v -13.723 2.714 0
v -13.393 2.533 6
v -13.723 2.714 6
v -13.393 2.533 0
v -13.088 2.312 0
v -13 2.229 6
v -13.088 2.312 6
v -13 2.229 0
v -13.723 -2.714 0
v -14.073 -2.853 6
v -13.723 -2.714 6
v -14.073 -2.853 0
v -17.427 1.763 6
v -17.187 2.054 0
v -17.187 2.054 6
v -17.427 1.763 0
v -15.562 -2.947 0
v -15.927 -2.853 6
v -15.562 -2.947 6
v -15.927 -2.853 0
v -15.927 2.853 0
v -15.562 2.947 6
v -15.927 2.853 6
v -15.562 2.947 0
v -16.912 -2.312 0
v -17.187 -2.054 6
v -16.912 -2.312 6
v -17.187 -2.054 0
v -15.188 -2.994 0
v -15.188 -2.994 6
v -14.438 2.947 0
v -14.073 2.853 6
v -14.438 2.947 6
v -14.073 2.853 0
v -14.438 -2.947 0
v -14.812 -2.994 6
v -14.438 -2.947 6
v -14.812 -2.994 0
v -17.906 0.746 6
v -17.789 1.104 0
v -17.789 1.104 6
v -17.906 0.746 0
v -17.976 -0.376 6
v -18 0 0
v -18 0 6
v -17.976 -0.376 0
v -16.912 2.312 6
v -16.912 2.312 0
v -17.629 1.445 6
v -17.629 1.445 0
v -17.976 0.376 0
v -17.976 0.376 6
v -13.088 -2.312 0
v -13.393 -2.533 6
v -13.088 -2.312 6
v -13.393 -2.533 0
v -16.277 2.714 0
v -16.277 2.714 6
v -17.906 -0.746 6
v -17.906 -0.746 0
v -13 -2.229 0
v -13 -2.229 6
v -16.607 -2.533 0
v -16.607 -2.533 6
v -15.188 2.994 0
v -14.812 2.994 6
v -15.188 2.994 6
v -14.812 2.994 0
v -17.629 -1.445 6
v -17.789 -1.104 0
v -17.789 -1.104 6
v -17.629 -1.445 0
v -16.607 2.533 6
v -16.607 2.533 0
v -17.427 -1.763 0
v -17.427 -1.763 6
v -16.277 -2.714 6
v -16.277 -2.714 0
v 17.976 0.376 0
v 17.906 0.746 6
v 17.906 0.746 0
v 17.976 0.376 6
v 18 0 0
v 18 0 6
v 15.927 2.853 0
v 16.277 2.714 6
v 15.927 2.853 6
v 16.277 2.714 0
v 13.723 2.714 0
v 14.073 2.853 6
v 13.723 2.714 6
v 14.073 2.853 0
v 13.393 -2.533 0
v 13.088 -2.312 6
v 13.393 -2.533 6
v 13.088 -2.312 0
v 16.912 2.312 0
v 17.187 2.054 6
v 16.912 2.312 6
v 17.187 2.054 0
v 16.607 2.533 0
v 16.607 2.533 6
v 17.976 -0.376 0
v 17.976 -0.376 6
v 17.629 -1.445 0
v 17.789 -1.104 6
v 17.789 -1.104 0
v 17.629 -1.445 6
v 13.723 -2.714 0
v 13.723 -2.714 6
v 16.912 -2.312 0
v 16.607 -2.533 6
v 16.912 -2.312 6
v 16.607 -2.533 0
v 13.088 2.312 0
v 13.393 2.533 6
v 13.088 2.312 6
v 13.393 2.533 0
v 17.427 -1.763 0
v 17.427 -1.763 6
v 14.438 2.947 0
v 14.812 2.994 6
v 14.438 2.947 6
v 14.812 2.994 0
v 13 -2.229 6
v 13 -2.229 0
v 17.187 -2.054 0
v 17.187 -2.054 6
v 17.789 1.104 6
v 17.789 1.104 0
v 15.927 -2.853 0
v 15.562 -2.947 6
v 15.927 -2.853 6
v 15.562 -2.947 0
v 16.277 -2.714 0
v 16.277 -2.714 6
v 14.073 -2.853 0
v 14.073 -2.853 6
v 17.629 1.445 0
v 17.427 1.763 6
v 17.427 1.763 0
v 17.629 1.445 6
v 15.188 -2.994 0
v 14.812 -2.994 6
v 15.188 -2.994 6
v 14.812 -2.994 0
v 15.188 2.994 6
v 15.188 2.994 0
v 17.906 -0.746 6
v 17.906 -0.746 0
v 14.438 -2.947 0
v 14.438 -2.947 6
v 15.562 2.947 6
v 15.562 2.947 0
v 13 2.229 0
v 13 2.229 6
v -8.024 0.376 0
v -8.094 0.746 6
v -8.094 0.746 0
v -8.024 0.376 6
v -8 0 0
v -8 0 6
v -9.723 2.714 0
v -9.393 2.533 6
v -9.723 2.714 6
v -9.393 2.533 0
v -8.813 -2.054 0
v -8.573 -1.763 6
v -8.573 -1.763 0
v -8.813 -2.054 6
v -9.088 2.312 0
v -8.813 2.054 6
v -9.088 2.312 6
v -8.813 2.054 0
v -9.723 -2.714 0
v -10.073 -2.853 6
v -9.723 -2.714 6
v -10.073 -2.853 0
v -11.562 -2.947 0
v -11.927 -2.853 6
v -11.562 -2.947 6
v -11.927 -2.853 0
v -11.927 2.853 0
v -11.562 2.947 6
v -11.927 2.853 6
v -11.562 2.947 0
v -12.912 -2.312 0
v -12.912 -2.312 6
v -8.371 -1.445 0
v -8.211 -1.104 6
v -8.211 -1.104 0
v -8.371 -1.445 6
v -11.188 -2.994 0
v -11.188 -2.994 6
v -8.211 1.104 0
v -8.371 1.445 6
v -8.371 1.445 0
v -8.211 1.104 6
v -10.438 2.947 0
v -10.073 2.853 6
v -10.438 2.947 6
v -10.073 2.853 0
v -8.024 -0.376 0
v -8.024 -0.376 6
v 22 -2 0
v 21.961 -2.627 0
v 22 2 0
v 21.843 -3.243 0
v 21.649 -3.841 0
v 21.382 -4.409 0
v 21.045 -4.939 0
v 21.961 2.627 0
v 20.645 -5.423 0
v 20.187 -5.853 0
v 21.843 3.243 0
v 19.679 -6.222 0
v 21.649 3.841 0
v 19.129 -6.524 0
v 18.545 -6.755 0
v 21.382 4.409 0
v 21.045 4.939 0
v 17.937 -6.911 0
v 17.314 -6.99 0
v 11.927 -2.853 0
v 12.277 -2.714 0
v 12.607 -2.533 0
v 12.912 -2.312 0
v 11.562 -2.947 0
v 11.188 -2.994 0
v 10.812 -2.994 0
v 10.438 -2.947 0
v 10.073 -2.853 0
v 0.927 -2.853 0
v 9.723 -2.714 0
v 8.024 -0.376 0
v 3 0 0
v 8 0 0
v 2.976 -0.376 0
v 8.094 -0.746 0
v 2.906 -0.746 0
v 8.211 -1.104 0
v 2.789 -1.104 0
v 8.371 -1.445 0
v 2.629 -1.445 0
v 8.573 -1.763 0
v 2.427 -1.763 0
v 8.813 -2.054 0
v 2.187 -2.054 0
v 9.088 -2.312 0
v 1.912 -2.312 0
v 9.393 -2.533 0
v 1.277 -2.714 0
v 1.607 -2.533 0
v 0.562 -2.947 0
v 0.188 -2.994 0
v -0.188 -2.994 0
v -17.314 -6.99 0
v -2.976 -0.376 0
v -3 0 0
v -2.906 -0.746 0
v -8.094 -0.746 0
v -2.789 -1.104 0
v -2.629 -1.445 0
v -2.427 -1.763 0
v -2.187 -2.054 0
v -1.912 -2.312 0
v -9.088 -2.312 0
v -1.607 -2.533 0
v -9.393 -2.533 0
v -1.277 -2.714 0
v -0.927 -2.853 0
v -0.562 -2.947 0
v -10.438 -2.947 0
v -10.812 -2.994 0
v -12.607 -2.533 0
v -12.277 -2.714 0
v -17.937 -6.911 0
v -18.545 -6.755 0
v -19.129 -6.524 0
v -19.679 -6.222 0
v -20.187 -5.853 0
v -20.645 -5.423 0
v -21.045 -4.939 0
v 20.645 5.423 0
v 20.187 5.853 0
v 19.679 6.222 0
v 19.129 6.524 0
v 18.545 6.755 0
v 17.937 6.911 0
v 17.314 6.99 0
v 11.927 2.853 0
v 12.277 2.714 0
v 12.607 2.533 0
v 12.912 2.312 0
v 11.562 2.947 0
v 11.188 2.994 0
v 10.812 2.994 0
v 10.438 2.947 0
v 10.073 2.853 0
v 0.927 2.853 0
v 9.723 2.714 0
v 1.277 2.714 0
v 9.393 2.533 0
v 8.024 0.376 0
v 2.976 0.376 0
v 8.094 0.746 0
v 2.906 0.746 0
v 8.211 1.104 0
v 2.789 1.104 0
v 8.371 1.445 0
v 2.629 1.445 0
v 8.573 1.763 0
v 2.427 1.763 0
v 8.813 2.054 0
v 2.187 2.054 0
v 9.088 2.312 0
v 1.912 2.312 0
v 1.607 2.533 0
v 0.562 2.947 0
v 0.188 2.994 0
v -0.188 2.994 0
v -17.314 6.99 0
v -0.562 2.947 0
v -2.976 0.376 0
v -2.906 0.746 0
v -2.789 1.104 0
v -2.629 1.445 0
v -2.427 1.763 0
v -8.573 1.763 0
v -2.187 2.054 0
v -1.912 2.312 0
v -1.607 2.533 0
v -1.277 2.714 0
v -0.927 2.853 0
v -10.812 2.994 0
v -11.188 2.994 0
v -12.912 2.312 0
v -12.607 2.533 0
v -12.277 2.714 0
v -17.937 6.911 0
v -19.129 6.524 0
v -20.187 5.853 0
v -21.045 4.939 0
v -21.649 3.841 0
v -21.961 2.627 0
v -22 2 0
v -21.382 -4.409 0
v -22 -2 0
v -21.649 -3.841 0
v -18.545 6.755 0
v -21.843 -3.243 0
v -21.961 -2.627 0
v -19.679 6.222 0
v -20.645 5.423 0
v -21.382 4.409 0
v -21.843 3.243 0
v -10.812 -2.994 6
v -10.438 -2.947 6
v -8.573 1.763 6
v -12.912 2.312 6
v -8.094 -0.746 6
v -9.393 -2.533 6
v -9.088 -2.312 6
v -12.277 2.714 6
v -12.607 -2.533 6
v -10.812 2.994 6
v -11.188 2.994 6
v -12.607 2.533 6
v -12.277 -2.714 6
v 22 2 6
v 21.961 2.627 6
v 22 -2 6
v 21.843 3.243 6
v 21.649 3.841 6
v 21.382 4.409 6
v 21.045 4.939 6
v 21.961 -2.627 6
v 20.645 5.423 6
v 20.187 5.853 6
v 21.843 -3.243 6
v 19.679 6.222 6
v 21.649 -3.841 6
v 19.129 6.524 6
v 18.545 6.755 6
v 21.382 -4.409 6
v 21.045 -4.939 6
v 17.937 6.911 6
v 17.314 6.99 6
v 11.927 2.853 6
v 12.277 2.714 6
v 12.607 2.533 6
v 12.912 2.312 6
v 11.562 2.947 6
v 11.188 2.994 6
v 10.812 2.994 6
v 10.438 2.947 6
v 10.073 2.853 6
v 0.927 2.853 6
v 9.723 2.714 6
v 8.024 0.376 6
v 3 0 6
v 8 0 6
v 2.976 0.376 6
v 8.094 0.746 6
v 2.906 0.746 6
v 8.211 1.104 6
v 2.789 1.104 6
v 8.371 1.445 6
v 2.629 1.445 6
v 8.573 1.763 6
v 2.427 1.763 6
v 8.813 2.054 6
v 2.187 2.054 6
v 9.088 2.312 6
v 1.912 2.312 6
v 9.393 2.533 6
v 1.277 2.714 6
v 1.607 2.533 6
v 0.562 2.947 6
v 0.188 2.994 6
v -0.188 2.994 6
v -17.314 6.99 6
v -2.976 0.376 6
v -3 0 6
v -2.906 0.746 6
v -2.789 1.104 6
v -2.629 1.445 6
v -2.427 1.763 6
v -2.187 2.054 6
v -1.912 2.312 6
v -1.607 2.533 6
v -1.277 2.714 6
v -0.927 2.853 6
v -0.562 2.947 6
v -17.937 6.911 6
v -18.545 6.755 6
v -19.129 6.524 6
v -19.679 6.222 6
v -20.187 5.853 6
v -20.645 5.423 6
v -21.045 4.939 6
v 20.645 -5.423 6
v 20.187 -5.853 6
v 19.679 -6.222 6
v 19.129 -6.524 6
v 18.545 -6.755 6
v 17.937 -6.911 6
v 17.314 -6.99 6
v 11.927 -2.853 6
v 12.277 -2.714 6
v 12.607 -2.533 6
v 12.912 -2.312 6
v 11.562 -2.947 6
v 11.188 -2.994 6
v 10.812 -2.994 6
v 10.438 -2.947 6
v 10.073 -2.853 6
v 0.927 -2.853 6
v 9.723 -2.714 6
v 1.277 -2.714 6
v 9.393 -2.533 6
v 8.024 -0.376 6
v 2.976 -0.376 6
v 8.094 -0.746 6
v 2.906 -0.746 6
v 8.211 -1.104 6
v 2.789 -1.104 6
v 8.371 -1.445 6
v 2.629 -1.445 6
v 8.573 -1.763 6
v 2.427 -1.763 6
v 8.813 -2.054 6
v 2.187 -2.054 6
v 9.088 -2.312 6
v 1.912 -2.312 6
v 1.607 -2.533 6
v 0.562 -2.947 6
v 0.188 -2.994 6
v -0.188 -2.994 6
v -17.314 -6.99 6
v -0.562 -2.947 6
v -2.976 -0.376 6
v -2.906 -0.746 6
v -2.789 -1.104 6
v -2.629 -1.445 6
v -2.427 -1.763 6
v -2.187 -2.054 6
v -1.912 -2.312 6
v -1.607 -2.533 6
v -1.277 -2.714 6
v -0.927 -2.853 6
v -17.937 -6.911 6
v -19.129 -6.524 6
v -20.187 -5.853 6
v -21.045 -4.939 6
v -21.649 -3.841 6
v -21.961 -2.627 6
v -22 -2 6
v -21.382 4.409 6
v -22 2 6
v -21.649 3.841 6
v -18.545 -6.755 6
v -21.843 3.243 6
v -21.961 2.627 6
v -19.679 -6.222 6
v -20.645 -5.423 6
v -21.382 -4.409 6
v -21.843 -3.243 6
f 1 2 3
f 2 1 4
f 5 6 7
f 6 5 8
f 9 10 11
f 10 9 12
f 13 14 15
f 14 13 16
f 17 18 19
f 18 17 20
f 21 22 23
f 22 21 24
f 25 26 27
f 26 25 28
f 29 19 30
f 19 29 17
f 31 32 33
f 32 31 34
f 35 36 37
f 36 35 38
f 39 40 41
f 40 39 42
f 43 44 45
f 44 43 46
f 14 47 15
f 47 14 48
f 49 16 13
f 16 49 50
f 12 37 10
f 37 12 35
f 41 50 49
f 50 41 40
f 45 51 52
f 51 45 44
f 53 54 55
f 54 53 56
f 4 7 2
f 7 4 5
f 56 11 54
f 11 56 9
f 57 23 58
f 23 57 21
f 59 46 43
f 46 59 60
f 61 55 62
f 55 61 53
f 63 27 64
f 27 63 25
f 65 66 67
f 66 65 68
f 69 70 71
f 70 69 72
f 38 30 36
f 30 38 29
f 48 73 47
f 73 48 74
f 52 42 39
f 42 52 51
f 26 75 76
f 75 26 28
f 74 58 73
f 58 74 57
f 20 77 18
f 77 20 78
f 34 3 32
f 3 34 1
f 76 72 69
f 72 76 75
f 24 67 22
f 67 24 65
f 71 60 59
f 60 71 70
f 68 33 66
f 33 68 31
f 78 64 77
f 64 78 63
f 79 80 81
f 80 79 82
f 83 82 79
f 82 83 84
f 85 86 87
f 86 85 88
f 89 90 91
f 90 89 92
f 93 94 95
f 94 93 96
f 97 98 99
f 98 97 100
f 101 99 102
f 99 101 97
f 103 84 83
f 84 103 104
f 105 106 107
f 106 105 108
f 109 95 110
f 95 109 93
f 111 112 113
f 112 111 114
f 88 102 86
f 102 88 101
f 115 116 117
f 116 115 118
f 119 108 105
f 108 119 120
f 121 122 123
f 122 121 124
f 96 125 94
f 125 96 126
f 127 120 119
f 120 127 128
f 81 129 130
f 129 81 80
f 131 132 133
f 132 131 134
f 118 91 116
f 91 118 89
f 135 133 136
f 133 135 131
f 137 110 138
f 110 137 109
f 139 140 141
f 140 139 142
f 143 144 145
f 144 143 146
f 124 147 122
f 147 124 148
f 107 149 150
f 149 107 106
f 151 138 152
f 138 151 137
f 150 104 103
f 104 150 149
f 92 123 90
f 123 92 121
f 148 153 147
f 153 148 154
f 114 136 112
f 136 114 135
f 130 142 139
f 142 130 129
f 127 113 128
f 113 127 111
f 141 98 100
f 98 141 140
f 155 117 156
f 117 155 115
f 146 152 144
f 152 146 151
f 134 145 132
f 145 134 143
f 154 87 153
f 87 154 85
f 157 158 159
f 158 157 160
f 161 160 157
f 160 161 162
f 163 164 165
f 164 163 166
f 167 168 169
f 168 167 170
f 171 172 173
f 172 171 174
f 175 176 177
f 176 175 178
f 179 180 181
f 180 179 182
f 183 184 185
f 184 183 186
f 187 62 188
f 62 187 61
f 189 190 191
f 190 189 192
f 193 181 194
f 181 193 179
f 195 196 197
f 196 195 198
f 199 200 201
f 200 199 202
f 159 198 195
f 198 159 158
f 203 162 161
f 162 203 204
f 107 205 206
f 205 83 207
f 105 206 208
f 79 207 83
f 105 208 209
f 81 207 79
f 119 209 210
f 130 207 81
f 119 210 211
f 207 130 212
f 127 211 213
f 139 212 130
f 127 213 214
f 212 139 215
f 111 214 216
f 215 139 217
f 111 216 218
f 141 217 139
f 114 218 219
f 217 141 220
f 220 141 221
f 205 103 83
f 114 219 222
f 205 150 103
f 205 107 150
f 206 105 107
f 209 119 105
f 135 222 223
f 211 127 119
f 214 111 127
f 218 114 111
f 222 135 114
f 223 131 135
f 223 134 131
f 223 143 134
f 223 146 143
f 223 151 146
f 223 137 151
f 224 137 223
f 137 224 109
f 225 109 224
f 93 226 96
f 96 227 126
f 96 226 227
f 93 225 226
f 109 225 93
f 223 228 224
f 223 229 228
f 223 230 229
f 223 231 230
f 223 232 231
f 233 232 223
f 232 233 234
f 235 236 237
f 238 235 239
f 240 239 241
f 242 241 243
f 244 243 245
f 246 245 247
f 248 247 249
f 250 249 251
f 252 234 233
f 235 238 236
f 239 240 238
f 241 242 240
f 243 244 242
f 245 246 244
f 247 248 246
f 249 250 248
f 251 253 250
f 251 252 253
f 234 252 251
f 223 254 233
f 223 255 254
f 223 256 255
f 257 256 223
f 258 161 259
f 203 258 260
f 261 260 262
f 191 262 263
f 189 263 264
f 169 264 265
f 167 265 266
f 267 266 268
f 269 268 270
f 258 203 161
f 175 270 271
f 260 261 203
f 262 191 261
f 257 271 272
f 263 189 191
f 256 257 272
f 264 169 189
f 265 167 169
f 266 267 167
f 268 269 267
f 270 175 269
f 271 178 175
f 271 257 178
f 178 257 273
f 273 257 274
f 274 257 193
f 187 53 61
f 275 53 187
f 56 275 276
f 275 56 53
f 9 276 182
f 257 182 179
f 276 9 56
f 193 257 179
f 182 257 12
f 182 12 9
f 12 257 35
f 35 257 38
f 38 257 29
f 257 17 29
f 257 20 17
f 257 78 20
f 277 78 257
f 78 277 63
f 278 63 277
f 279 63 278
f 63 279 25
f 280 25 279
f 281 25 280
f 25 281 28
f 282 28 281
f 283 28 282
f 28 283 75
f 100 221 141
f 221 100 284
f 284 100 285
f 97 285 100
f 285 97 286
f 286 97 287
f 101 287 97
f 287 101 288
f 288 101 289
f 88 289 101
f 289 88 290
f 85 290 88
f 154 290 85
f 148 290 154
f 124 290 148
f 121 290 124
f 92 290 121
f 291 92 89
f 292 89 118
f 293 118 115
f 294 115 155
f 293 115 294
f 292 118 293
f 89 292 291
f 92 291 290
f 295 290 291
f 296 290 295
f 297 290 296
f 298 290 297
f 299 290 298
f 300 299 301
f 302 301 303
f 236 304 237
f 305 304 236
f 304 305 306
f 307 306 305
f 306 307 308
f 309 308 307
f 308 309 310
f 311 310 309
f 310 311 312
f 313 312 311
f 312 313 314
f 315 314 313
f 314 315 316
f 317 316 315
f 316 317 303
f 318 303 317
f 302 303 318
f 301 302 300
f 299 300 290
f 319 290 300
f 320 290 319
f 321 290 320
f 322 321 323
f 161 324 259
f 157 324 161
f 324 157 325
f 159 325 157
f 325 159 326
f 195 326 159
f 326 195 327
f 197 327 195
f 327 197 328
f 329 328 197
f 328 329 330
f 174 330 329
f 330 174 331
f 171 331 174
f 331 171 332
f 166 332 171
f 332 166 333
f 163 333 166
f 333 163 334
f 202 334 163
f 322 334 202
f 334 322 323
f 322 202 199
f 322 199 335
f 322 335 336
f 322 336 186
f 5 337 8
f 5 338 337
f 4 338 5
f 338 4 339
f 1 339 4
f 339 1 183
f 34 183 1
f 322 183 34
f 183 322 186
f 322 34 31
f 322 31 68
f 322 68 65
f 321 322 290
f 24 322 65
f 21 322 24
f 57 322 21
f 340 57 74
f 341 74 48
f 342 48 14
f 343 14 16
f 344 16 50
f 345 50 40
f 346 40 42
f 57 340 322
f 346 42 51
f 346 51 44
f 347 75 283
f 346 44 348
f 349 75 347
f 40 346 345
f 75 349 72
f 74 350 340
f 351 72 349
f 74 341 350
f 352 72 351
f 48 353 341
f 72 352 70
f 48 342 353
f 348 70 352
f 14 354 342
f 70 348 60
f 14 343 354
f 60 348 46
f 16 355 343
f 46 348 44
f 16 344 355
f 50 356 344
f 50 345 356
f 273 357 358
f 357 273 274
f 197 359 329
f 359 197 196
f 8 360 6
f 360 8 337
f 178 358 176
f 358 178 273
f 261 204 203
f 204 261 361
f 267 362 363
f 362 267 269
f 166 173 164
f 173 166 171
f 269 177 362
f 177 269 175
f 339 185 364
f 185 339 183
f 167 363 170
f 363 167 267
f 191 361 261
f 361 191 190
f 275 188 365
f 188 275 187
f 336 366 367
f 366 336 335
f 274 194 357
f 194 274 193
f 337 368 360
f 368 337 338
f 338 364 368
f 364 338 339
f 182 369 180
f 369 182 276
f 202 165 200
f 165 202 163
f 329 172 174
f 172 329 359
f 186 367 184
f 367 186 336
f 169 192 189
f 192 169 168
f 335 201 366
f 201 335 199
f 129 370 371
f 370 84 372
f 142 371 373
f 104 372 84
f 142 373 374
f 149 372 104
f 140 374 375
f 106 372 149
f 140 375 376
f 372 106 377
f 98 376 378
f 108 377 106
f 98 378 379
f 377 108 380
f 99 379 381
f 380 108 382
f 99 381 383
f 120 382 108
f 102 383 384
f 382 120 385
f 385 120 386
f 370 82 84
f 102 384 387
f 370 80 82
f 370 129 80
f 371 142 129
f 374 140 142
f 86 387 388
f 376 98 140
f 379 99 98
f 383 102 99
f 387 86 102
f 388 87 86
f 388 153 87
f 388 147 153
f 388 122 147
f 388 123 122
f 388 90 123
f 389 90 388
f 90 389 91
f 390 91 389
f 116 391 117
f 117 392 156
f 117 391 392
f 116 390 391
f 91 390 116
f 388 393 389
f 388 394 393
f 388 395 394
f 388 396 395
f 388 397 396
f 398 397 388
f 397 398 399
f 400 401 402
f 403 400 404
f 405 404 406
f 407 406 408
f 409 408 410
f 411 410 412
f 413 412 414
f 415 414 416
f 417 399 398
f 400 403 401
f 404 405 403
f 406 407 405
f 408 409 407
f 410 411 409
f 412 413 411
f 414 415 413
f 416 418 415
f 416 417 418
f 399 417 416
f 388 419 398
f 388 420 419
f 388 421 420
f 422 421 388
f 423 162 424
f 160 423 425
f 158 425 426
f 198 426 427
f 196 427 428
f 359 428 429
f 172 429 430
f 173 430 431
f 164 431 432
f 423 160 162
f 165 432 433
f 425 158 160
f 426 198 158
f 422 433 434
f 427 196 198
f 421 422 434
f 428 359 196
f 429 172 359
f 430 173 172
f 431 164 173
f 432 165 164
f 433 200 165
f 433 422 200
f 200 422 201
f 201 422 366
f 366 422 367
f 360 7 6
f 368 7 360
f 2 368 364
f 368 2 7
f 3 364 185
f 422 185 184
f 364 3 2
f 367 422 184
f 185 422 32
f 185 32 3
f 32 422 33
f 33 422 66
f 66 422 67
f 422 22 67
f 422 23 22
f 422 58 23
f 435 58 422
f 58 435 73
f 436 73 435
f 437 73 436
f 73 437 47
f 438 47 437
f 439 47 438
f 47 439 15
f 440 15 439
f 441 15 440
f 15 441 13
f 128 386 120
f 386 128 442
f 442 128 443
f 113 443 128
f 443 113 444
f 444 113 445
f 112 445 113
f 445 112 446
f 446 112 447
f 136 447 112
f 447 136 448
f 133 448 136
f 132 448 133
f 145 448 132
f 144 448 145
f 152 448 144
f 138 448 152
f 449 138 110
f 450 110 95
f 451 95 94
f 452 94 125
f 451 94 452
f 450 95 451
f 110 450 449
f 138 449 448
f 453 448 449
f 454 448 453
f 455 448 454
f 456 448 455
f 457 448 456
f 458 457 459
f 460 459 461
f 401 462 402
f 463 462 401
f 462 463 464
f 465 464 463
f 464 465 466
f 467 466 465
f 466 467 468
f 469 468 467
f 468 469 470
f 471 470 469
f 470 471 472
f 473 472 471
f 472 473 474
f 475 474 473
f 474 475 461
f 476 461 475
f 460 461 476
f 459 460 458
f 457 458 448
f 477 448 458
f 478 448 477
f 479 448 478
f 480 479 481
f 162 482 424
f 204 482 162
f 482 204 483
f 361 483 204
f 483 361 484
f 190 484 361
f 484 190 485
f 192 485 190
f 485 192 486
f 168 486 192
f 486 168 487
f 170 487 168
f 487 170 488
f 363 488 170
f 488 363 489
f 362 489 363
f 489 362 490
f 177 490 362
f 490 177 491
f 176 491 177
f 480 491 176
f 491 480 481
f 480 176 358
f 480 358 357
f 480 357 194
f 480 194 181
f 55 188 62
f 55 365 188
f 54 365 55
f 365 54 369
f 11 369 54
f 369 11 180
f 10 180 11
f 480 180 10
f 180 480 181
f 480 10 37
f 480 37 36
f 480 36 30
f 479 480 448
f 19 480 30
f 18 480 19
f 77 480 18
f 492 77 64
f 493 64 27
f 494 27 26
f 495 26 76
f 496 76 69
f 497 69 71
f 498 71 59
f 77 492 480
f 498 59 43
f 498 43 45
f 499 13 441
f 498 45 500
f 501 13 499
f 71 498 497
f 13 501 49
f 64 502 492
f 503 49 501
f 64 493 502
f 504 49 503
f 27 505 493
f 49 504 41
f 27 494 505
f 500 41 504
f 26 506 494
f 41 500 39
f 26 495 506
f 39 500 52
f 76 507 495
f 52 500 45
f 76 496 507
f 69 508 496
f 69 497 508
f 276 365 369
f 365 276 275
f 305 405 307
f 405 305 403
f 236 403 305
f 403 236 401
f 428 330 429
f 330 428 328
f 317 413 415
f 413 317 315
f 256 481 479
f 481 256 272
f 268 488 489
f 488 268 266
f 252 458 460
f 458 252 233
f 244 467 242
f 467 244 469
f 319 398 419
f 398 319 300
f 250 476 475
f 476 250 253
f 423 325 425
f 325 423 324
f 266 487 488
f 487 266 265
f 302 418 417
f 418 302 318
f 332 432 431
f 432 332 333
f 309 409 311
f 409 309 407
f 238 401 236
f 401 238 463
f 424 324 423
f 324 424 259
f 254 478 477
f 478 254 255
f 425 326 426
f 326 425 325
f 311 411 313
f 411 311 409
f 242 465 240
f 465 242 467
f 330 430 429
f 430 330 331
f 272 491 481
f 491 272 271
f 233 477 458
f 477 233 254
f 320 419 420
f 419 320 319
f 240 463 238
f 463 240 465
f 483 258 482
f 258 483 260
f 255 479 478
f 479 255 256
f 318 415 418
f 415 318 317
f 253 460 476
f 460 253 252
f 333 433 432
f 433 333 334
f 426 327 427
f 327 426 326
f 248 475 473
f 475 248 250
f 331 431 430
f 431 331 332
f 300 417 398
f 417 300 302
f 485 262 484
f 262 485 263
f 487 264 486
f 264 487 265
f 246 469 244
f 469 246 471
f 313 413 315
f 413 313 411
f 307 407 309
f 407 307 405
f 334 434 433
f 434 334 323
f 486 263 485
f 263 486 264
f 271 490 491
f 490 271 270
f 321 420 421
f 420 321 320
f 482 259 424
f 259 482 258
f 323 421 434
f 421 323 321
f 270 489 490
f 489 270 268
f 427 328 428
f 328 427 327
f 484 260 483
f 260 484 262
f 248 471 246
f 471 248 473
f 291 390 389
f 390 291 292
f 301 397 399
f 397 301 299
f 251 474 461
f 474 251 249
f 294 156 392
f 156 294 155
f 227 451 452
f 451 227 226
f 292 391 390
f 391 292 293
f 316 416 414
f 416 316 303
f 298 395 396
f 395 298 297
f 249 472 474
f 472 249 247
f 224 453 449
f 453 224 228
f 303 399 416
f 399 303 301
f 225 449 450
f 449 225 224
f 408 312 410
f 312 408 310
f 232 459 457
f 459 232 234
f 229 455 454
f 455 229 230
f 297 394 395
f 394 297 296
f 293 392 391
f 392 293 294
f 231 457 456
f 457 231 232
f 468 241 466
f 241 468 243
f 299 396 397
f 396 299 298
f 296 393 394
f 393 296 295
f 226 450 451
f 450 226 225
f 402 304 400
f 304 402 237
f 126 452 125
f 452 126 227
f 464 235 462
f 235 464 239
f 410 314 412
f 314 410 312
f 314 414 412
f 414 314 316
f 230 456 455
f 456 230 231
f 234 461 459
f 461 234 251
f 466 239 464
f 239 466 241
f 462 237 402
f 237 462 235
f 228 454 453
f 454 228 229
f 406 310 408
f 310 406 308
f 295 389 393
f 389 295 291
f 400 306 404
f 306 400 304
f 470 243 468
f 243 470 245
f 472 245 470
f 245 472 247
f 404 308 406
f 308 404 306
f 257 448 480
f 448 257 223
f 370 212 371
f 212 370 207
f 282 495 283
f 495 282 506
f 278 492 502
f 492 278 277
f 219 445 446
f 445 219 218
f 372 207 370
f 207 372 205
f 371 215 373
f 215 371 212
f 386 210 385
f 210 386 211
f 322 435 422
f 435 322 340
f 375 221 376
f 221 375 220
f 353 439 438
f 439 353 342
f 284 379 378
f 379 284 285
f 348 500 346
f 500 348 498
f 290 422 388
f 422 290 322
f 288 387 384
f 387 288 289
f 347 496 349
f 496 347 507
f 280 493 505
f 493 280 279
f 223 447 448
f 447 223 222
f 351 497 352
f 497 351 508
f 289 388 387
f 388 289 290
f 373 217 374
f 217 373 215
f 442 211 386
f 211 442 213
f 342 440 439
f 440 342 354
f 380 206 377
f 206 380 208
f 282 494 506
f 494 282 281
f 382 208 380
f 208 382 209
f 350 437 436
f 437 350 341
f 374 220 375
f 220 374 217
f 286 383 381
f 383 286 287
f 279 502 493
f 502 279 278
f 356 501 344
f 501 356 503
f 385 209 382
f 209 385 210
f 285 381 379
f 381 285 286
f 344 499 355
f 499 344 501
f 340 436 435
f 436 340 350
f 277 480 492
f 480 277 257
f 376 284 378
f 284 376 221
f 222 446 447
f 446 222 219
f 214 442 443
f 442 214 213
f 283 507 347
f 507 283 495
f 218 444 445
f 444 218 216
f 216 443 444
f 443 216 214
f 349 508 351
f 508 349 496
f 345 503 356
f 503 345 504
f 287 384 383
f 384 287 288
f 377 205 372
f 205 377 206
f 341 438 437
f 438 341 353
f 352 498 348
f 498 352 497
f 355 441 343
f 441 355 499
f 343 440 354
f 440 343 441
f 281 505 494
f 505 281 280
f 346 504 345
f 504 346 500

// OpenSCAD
$fn = 50;


difference() {
	union() {
		hull() {
			translate(v = [-17.0000000000, 2.0000000000, 0]) {
				cylinder(h = 6, r = 5);
			}
			translate(v = [17.0000000000, 2.0000000000, 0]) {
				cylinder(h = 6, r = 5);
			}
			translate(v = [-17.0000000000, -2.0000000000, 0]) {
				cylinder(h = 6, r = 5);
			}
			translate(v = [17.0000000000, -2.0000000000, 0]) {
				cylinder(h = 6, r = 5);
			}
		}
	}
	union() {
		#translate(v = [-15.0000000000, 0.0000000000, -100.0000000000]) {
			cylinder(h = 200, r = 3.0000000000);
		}
		#translate(v = [-15.0000000000, 0.0000000000, -100.0000000000]) {
			cylinder(h = 200, r = 3.0000000000);
		}
		#translate(v = [15.0000000000, 0.0000000000, -100.0000000000]) {
			cylinder(h = 200, r = 3.0000000000);
		}
		#translate(v = [15.0000000000, 0.0000000000, -100.0000000000]) {
			cylinder(h = 200, r = 3.0000000000);
		}
		#translate(v = [-11.0000000000, 0, 0]) {
			cylinder(h = 6, r = 3.0000000000);
		}
		#cylinder(h = 6, r = 3.0000000000);
		#translate(v = [11.0000000000, 0, 0]) {
			cylinder(h = 6, r = 3.0000000000);
		}
	}
}
